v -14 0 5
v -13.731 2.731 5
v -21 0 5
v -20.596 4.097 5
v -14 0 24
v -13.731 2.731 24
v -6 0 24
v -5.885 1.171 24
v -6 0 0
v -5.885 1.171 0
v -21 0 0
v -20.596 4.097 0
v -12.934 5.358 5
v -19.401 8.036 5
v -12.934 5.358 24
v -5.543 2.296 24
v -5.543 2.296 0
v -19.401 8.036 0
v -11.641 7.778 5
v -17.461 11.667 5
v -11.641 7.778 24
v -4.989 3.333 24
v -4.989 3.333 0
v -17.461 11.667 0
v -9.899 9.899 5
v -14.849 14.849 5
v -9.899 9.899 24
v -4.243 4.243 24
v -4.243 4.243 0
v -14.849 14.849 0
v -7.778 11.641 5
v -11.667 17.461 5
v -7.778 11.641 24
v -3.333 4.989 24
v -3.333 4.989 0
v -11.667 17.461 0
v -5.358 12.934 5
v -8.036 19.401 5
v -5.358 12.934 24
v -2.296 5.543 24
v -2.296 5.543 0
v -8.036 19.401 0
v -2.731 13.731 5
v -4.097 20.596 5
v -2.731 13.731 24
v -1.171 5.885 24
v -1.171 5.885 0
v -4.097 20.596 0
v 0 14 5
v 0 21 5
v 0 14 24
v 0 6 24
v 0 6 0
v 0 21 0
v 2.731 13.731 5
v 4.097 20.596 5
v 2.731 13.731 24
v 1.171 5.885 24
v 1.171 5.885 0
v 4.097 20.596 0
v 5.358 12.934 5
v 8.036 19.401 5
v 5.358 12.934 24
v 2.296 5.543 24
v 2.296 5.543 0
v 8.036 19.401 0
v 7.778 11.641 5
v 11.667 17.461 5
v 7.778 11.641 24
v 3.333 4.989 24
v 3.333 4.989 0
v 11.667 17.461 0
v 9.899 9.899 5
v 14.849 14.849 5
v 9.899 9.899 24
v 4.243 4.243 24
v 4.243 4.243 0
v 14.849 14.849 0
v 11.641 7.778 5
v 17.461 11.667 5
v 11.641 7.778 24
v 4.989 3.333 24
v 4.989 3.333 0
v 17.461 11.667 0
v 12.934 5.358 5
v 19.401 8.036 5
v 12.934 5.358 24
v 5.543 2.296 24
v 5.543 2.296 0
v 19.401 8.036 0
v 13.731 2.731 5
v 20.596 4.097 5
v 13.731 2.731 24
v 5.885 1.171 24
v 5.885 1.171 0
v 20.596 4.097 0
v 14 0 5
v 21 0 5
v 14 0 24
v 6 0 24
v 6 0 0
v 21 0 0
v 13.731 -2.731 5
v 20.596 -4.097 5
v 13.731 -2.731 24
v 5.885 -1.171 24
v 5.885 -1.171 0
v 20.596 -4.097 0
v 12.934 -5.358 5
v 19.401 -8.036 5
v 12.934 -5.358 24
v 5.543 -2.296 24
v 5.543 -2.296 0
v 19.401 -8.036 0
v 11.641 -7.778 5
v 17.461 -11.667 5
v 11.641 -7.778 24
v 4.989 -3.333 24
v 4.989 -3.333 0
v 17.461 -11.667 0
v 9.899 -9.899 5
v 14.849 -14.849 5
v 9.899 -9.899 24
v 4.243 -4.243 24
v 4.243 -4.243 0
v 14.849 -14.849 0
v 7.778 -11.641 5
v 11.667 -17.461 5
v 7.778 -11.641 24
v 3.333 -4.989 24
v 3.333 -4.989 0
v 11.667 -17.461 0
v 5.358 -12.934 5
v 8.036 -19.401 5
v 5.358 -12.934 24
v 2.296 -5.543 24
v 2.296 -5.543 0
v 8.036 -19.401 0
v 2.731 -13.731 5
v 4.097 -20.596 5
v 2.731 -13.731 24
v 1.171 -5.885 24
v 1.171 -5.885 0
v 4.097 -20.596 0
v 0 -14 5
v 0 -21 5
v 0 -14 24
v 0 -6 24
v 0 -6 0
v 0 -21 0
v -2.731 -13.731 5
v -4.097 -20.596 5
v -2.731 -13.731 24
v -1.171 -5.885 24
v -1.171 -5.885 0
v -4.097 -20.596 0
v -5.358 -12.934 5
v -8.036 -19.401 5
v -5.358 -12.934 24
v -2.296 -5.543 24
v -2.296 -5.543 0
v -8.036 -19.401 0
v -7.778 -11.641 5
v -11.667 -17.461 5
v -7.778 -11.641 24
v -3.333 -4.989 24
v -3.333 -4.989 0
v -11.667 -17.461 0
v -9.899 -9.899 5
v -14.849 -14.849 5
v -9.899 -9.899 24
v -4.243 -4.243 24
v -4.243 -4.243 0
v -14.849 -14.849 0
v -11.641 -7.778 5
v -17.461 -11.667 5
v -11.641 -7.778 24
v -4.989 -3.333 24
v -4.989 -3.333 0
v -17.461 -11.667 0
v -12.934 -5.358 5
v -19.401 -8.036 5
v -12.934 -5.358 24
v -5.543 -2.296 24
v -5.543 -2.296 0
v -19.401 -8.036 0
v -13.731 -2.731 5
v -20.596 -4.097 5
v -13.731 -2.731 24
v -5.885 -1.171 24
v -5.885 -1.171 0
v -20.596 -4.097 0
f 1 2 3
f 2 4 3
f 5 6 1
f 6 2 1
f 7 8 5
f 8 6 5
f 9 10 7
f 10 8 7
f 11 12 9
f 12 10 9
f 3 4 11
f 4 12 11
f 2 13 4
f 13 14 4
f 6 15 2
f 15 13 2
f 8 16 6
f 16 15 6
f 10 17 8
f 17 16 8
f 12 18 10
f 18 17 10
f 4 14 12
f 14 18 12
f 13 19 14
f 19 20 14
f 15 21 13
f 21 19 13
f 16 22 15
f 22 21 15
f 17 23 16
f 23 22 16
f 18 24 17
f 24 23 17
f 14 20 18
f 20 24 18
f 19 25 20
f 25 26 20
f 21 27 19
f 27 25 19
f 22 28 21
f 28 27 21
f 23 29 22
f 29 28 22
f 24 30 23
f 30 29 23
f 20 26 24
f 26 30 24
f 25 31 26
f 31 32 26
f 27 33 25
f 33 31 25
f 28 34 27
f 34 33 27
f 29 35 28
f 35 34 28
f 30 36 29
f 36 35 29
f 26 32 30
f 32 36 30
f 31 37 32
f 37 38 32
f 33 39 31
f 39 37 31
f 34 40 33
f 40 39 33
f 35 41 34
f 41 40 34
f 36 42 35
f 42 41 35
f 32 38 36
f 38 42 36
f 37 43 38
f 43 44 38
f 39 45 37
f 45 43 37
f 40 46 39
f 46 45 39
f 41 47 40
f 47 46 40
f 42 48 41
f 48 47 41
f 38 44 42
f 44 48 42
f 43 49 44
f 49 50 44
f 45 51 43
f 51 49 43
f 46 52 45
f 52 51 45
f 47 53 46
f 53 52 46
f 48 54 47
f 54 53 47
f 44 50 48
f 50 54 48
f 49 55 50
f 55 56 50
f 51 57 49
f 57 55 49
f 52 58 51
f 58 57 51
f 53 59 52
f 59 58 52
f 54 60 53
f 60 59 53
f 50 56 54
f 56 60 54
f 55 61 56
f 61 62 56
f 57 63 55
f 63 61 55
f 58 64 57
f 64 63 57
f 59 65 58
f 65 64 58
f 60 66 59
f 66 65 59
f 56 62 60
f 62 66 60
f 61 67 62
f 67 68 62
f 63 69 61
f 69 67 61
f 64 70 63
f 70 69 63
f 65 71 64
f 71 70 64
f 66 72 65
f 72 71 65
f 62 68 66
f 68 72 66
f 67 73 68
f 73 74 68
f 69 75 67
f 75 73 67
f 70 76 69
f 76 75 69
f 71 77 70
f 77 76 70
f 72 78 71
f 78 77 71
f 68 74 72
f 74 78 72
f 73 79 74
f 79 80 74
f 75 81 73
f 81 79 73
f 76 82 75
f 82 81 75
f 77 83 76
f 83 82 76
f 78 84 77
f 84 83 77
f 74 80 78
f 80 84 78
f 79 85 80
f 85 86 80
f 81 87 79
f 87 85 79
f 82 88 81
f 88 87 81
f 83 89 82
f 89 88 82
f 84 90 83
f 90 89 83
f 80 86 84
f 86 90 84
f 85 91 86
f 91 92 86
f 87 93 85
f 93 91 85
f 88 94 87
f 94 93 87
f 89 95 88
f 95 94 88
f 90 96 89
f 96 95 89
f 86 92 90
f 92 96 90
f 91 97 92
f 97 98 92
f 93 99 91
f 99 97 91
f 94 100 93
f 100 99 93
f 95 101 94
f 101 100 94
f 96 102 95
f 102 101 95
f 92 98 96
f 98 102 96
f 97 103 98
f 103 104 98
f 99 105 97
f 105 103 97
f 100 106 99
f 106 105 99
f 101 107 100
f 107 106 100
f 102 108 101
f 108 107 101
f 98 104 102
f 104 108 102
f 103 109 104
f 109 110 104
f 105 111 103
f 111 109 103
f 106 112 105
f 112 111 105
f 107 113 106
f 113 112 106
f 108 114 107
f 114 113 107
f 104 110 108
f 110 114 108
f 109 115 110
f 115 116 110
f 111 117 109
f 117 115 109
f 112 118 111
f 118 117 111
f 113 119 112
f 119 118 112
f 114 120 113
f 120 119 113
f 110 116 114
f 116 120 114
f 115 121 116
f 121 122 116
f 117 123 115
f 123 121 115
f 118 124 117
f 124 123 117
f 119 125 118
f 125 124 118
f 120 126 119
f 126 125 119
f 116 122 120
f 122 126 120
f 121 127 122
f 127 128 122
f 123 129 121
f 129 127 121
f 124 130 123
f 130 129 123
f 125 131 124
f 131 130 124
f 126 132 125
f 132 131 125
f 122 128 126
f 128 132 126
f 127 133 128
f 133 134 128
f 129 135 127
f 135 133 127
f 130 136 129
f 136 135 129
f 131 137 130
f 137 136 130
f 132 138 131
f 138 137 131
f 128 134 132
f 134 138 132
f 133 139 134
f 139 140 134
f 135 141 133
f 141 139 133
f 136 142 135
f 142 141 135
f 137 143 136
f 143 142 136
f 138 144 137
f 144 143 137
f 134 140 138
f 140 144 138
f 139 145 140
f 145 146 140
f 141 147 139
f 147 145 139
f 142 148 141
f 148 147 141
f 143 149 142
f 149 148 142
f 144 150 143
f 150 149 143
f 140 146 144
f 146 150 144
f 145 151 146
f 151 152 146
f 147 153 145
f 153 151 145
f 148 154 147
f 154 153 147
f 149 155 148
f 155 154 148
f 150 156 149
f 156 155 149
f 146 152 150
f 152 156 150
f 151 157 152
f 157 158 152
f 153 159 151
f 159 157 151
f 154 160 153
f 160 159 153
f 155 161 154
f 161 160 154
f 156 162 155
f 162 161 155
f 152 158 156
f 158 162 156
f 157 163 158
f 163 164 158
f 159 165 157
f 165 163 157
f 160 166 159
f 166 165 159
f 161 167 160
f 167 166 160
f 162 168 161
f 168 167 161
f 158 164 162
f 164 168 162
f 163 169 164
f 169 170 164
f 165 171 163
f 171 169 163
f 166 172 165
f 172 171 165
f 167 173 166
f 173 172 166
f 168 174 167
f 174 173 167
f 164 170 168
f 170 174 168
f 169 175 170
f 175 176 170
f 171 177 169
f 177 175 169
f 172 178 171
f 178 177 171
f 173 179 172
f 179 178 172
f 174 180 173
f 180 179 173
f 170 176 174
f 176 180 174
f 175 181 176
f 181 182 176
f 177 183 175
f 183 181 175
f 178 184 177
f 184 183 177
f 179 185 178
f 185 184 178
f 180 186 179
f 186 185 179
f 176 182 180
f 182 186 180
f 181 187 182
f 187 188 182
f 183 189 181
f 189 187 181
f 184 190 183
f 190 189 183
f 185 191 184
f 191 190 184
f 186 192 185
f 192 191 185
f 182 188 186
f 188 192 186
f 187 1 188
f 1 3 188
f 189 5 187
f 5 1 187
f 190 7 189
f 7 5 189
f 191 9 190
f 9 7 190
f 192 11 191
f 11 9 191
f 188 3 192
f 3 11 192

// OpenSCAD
$fn = 32;

// ----------------------------------------------------------------------
// Arc stop: collar, 24 mm thick
// ----------------------------------------------------------------------

// --- parameters (mm) ---
revolve_angle = 360;      // full turn around the Z axis
profile_points = 6;       // points of the closed outline

profile = [[6, 0], [21, 0], [21, 5], [14, 5], [14, 24], [6, 24]];  // single closed polygon, 6 points, counter clockwise

// --- the one profile operation ---
rotate_extrude(angle = revolve_angle) polygon(points = profile);
